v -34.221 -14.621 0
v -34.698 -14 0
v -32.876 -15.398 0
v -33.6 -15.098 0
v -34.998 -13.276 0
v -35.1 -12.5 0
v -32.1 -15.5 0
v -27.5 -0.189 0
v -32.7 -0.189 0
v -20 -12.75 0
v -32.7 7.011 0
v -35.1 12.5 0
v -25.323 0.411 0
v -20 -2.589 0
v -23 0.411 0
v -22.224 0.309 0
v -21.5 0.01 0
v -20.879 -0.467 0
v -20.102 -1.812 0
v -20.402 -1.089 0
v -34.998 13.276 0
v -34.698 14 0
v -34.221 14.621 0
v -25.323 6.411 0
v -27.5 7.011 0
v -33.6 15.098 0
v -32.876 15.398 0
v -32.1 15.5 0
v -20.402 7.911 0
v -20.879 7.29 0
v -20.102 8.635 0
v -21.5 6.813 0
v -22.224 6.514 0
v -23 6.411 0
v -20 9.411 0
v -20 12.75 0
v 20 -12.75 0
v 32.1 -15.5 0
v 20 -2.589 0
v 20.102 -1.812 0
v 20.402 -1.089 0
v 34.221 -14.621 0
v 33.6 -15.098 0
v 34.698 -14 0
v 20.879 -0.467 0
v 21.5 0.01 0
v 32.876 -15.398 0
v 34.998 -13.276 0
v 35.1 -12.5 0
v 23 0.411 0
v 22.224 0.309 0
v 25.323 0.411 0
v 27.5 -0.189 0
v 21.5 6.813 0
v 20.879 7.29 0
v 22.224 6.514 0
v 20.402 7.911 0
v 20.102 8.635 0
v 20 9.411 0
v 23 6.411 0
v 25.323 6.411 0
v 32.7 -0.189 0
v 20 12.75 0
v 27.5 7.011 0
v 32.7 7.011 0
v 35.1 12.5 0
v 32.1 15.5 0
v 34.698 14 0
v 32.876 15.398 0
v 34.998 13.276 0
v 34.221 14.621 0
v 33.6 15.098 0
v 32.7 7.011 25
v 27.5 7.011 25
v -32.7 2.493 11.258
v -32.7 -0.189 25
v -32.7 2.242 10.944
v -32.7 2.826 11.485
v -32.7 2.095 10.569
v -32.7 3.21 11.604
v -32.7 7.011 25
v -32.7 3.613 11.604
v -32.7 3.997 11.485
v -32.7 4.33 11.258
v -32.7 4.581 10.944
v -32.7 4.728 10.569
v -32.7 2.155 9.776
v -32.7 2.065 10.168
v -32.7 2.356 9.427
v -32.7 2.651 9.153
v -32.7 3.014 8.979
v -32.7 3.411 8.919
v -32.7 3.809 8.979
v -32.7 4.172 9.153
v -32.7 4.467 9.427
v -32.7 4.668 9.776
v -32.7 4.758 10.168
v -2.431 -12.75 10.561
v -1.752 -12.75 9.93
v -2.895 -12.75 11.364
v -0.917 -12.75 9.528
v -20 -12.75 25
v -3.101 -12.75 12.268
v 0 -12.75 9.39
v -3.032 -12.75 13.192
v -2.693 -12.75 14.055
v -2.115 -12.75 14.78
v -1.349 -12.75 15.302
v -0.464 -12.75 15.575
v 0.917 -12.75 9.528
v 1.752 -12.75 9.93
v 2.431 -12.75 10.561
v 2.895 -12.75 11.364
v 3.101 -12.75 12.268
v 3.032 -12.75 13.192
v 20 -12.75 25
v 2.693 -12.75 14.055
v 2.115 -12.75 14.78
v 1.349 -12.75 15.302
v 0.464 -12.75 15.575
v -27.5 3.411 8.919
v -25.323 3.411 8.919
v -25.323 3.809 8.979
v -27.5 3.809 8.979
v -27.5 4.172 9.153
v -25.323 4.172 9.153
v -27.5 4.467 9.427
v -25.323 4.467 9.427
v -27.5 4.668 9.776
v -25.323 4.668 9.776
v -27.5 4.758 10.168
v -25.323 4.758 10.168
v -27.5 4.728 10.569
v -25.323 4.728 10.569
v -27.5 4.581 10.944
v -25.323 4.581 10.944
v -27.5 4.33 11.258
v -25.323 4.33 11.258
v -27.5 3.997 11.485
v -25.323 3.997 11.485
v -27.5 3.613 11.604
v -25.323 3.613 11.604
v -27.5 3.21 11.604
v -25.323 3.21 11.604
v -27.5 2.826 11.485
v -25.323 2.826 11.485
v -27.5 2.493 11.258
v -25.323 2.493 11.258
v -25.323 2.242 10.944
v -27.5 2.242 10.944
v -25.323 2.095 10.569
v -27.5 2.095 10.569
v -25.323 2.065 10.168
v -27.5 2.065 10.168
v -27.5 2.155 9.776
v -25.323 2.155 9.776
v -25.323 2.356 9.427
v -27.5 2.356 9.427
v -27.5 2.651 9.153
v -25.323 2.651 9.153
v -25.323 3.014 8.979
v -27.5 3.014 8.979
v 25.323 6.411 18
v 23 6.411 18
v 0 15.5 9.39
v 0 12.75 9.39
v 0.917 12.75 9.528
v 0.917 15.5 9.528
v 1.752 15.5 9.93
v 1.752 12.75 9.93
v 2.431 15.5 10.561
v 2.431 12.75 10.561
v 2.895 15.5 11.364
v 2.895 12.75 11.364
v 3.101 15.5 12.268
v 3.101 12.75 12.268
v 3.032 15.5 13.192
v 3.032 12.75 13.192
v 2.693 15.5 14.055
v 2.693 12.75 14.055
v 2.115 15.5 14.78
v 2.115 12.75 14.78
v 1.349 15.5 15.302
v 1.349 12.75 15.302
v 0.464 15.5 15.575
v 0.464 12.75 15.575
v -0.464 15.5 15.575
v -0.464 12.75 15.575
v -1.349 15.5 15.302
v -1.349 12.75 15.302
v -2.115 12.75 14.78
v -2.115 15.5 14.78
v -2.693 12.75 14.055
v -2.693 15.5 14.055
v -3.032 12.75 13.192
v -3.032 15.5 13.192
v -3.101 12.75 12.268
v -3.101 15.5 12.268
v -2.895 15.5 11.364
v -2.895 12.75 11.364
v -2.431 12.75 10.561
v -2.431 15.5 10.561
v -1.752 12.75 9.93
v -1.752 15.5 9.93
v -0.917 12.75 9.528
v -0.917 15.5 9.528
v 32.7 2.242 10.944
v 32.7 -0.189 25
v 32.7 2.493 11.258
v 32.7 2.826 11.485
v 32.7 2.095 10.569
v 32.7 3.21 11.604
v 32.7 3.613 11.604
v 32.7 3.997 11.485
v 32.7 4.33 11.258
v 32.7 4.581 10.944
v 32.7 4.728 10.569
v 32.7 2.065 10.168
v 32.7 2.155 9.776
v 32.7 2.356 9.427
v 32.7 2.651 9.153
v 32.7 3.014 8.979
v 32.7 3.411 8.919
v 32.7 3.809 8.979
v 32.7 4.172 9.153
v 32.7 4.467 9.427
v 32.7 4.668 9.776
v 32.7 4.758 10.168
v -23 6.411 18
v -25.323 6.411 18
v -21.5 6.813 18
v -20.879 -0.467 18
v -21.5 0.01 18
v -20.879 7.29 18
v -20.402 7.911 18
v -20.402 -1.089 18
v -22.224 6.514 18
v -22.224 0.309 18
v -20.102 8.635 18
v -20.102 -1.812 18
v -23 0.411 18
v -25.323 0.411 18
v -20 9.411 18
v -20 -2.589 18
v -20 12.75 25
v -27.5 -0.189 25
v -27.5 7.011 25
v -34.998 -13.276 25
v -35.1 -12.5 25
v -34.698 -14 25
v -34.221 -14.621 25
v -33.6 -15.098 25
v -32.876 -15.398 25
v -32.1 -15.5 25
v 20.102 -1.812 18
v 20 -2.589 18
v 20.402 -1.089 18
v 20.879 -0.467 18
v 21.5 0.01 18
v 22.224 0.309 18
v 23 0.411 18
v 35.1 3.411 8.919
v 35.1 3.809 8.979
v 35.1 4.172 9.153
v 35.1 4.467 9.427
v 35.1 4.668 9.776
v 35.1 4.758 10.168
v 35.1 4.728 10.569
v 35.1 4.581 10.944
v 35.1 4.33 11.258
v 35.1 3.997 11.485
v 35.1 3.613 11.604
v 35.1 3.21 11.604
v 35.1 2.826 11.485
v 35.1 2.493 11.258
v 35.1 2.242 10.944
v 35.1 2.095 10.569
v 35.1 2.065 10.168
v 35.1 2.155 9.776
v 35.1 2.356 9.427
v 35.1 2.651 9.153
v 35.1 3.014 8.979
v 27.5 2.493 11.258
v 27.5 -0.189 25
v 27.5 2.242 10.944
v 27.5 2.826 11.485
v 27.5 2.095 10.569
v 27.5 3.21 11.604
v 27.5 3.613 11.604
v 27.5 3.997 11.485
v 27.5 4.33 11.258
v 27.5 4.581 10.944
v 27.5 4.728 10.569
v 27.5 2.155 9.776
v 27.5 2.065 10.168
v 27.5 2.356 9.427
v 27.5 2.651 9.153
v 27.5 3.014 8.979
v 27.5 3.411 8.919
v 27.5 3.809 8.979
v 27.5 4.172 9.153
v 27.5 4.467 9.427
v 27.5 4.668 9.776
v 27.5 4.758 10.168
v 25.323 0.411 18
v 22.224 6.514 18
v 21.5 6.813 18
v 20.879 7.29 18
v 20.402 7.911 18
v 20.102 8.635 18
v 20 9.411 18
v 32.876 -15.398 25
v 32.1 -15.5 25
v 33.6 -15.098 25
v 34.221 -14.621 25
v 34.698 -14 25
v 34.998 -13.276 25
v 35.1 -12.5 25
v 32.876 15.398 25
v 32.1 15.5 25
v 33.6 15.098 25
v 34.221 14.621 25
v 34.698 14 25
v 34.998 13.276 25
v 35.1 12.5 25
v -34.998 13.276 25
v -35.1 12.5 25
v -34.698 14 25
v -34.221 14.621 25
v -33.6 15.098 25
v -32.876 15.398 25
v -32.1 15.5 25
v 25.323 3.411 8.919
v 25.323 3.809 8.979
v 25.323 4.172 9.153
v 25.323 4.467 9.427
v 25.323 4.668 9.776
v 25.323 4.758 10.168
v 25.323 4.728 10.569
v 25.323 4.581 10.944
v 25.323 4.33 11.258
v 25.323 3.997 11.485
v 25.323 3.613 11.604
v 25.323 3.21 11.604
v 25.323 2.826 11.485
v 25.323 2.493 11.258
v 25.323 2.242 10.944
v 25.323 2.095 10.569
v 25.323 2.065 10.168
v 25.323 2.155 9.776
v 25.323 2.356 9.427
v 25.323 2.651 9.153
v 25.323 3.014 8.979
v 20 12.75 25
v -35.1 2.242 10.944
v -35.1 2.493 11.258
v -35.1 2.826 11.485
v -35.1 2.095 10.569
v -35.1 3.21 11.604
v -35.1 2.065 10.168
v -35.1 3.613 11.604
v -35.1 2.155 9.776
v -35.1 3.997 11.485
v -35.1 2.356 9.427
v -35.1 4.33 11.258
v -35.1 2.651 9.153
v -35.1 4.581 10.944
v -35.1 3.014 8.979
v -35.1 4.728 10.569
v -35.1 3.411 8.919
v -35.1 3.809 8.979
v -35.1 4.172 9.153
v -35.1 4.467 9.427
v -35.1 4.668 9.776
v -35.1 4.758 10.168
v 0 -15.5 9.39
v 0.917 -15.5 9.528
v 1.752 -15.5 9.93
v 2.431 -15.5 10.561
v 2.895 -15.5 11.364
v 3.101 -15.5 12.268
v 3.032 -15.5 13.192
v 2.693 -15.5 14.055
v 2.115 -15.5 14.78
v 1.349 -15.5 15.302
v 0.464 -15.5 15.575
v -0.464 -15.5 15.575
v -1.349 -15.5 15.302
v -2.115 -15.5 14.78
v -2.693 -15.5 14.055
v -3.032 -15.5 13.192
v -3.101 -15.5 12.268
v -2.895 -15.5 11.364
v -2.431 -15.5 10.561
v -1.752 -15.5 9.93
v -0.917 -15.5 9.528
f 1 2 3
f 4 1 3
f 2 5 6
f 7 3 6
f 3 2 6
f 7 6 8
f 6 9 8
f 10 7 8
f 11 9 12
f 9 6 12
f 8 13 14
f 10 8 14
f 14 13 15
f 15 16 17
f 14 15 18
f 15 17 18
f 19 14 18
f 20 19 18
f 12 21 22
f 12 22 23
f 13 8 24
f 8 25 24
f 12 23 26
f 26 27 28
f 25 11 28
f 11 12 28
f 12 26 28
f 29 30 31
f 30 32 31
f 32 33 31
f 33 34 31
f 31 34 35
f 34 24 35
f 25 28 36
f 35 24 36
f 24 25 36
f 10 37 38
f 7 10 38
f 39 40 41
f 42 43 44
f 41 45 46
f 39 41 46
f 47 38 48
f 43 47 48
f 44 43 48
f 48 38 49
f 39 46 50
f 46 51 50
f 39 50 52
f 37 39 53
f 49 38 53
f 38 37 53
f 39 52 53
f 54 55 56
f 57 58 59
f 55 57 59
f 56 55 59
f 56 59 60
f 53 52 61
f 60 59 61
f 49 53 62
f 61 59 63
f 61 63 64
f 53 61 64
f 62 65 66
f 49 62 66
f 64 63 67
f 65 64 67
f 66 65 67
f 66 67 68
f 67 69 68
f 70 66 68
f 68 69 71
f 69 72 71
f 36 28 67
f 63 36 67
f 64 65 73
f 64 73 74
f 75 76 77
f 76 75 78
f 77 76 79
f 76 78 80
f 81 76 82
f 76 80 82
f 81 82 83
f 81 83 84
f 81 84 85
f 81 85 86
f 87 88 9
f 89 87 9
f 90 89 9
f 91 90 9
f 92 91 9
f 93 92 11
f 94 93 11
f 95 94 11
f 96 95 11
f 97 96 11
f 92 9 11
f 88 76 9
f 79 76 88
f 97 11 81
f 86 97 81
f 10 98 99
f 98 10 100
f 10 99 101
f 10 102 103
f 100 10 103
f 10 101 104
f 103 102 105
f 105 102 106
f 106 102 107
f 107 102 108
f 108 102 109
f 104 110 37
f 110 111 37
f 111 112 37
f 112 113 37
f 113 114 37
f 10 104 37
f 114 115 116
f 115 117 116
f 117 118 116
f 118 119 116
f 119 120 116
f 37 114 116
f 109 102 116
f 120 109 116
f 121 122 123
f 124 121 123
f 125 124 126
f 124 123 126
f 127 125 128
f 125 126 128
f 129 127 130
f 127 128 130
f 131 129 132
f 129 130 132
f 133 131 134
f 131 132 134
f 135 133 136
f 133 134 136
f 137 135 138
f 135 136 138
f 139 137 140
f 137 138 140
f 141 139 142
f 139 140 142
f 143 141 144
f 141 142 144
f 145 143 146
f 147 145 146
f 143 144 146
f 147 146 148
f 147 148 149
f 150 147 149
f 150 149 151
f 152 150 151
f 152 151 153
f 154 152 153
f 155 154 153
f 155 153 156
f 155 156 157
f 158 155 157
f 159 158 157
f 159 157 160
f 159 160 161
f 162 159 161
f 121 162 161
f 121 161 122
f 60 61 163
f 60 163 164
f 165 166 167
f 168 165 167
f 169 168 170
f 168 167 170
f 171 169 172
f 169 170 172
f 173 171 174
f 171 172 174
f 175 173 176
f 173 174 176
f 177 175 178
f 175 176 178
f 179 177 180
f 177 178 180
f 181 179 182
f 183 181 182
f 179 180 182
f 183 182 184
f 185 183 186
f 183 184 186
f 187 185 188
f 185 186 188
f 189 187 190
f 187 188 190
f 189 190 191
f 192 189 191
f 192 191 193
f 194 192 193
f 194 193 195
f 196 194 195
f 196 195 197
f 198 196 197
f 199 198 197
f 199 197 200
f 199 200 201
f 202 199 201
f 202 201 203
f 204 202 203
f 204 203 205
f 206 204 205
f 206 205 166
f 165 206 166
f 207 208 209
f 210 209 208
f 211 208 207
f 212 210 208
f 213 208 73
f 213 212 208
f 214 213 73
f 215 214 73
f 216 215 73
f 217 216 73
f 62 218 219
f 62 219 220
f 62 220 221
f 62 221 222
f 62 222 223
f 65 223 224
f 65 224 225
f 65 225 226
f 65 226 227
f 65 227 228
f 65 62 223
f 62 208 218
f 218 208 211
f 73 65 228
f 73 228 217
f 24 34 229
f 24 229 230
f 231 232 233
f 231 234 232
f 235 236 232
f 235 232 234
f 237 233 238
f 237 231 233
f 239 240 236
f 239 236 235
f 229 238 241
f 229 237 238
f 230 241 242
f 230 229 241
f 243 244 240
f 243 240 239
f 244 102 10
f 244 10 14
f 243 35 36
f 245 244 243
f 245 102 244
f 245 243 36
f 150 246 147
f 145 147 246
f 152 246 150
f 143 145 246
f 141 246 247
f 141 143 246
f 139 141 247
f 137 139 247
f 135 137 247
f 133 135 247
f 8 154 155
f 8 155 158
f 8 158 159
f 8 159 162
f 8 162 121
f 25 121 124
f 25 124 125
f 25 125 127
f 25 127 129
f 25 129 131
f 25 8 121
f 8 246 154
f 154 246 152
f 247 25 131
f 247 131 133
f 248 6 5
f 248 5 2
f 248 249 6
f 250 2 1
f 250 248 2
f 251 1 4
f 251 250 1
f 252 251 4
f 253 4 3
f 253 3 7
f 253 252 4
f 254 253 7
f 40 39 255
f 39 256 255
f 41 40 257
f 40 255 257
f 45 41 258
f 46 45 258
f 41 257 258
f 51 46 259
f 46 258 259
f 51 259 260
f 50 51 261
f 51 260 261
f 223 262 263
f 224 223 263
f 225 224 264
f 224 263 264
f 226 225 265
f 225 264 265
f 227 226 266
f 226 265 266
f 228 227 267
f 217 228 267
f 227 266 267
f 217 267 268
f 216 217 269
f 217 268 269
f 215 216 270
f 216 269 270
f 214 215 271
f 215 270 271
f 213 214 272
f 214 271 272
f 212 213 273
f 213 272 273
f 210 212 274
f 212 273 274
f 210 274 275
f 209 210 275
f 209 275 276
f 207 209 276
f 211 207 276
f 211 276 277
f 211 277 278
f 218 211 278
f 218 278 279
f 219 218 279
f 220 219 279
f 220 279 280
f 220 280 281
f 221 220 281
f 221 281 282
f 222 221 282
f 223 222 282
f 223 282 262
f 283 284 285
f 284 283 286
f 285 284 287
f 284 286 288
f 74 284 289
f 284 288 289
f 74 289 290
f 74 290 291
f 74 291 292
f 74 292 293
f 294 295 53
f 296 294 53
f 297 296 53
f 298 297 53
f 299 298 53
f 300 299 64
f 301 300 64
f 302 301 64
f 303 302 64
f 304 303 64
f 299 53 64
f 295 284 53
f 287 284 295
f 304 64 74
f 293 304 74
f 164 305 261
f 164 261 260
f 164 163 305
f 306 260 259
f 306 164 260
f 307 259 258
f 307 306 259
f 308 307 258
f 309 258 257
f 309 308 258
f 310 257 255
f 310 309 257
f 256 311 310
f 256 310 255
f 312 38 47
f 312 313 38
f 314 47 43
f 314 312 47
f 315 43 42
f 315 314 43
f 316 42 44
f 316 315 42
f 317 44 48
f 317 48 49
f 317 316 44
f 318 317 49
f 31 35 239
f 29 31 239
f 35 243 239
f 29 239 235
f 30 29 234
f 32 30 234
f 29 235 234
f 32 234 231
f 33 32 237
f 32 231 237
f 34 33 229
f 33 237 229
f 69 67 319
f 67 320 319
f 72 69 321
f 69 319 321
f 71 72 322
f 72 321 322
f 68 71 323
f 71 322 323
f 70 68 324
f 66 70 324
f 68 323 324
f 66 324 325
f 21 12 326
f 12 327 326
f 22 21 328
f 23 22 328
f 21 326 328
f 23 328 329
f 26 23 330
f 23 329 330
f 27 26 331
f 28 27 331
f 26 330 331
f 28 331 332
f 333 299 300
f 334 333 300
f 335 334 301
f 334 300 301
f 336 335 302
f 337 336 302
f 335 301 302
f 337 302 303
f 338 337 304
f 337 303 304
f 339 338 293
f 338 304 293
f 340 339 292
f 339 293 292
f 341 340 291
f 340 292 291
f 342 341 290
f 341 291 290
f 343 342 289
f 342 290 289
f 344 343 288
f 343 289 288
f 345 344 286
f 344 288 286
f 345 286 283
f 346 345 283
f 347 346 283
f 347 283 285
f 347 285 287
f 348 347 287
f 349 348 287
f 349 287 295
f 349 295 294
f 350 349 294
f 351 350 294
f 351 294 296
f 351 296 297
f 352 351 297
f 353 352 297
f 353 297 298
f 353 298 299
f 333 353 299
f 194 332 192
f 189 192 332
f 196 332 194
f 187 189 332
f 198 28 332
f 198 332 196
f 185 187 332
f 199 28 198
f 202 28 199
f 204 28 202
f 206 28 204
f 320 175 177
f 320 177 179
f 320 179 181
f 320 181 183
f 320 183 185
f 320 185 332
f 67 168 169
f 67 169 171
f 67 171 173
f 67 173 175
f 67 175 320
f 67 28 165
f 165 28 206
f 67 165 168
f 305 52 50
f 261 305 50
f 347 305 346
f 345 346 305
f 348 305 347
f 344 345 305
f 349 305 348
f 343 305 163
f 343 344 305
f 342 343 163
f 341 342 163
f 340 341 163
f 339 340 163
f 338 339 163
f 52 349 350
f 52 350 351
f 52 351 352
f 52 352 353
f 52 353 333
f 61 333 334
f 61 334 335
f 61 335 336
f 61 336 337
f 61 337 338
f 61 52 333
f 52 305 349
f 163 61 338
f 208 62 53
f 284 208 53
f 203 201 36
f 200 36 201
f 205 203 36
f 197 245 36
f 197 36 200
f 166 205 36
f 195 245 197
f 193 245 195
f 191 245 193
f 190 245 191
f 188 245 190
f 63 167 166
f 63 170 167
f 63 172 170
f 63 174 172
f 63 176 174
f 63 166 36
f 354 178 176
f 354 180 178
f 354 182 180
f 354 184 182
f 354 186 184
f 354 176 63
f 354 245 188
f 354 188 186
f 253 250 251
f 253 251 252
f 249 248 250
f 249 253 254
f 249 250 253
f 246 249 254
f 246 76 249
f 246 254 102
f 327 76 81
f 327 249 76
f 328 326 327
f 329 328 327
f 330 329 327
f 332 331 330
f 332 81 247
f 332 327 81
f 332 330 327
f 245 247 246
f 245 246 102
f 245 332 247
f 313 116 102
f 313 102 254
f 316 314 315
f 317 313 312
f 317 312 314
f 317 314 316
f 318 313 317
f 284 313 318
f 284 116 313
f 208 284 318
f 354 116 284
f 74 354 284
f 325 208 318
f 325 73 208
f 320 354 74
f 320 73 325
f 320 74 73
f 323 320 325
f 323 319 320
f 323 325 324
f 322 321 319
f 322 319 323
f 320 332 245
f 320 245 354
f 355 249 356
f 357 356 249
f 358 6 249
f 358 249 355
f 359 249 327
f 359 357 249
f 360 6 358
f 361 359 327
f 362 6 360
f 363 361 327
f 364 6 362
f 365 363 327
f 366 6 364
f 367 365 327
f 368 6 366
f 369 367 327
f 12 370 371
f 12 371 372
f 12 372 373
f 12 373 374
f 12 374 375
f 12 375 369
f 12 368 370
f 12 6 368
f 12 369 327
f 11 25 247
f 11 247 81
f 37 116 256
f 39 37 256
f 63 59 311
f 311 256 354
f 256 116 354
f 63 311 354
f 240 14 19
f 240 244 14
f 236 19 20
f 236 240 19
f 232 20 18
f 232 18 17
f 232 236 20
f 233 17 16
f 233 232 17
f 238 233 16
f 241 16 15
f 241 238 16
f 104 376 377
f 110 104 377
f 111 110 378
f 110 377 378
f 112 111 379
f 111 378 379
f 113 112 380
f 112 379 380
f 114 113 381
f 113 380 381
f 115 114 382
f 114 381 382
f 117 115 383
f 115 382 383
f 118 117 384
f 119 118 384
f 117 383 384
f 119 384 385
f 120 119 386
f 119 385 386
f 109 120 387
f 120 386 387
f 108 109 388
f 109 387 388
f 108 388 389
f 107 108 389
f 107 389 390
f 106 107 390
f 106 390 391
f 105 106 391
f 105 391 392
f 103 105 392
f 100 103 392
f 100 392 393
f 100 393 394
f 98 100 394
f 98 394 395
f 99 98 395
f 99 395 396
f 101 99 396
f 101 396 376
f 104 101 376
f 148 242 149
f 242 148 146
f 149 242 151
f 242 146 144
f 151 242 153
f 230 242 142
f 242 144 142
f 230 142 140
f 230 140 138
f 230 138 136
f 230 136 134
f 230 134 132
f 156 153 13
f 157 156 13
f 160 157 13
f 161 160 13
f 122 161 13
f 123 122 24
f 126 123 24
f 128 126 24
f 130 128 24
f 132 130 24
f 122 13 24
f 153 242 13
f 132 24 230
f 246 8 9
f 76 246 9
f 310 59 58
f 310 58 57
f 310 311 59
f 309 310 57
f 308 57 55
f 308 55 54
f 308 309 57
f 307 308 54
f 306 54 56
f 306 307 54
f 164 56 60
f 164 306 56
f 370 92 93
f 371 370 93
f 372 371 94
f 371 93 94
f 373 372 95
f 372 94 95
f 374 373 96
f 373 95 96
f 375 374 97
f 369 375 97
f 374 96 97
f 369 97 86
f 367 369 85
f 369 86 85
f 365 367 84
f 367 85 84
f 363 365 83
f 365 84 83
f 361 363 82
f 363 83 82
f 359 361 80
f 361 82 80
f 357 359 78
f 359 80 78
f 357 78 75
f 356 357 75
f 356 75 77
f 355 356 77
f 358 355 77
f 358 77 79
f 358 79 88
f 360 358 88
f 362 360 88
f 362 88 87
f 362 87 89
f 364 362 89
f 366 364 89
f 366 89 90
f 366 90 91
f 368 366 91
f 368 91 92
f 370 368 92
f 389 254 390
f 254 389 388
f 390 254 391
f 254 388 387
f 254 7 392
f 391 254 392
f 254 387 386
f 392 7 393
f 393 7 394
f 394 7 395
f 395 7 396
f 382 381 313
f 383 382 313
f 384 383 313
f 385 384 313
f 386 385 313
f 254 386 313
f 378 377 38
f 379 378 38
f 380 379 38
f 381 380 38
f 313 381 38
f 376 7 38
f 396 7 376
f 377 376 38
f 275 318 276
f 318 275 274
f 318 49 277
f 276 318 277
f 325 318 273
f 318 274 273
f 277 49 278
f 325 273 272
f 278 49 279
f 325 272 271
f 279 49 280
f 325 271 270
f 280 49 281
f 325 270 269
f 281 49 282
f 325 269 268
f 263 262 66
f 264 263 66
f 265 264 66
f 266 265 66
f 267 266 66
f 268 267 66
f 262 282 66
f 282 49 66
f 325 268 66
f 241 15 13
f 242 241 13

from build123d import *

# Parameters (mm, degrees)
SKETCH_1_W          = 70.2
SKETCH_1_H          = 31
EXTRUDE_1_DEPTH     = 25
SKETCH_2_W          = 40
SKETCH_2_H          = 25.5
CUT_EXTRUDE_1_DEPTH = 32
SKETCH_3_R          = 3.11
CUT_EXTRUDE_2_DEPTH = 41
SKETCH_4_W          = 5.2
SKETCH_4_H          = 7.2
CUT_EXTRUDE_3_DEPTH = 25
SKETCH_5_R          = 1.35
CUT_EXTRUDE_4_DEPTH = 122
FILLET_1_R          = 3
SKETCH_6_W          = 5.323047144
SKETCH_6_H          = 6
CUT_EXTRUDE_5_DEPTH = 18
FILLET_2_R          = 3


with BuildPart() as part:
    # 草图1 → 凸台-拉伸1 (new body)
    with BuildSketch(Plane.XY):
        Rectangle(SKETCH_1_W, SKETCH_1_H)
    extrude(amount=EXTRUDE_1_DEPTH)

    # 草图2 → 切除-拉伸1 (cut)
    with BuildSketch(Plane.XY.offset(25)):
        Rectangle(SKETCH_2_W, SKETCH_2_H)
    extrude(amount=-CUT_EXTRUDE_1_DEPTH, mode=Mode.SUBTRACT)

    # 草图3 → 切除-拉伸2 (cut)
    with BuildSketch(Plane.XZ.offset(15.5)):
        with Locations(Location((0, 12.5, 0), (0, 0, 270))):
            Circle(SKETCH_3_R)
    extrude(amount=-CUT_EXTRUDE_2_DEPTH, mode=Mode.SUBTRACT)

    # 草图4 → 切除-拉伸3 (cut)
    with BuildSketch(Plane(origin=(0, 0, 0), x_dir=(-1, 0, 0), z_dir=(0, 0, -1))):
        with Locations((30.1, 3.411480114)):
            Rectangle(SKETCH_4_W, SKETCH_4_H)
        with Locations((-30.1, 3.411480114)):
            Rectangle(SKETCH_4_W, SKETCH_4_H)
    extrude(amount=-CUT_EXTRUDE_3_DEPTH, mode=Mode.SUBTRACT)

    # 草图5 → 切除-拉伸4 (cut)
    with BuildSketch(Plane(origin=(35.1, 0, 0), x_dir=(0, 0, -1), z_dir=(1, 0, 0))):
        with Locations((-10.268877546, 3.411480114)):
            Circle(SKETCH_5_R)
    extrude(amount=-CUT_EXTRUDE_4_DEPTH, mode=Mode.SUBTRACT)

    # 圆角1
    fillet_1_edges = [part.edges().sort_by_distance(p)[0] for p in [
        (35.1, -15.5, 12.5),
        (-35.1, -15.5, 12.5),
        (-35.1, 15.5, 12.5),
        (35.1, 15.5, 12.5),
    ]]
    fillet(fillet_1_edges, radius=FILLET_1_R)

    # 草图6 → 切除-拉伸5 (cut)
    with BuildSketch(Plane(origin=(0, 0, 0), x_dir=(-1, 0, 0), z_dir=(0, 0, -1))):
        with Locations((-22.661523572, 3.411480114)):
            Rectangle(SKETCH_6_W, SKETCH_6_H)
        with Locations((22.661523572, 3.411480114)):
            Rectangle(SKETCH_6_W, SKETCH_6_H)
    extrude(amount=-CUT_EXTRUDE_5_DEPTH, mode=Mode.SUBTRACT)

    # 圆角2
    fillet_2_edges = [part.edges().sort_by_distance(p)[0] for p in [
        (20, 6.411480114, 9),
        (20, 0.411480114, 9),
        (-20, 0.411480114, 9),
        (-20, 6.411480114, 9),
    ]]
    fillet(fillet_2_edges, radius=FILLET_2_R)


solid = part.part
